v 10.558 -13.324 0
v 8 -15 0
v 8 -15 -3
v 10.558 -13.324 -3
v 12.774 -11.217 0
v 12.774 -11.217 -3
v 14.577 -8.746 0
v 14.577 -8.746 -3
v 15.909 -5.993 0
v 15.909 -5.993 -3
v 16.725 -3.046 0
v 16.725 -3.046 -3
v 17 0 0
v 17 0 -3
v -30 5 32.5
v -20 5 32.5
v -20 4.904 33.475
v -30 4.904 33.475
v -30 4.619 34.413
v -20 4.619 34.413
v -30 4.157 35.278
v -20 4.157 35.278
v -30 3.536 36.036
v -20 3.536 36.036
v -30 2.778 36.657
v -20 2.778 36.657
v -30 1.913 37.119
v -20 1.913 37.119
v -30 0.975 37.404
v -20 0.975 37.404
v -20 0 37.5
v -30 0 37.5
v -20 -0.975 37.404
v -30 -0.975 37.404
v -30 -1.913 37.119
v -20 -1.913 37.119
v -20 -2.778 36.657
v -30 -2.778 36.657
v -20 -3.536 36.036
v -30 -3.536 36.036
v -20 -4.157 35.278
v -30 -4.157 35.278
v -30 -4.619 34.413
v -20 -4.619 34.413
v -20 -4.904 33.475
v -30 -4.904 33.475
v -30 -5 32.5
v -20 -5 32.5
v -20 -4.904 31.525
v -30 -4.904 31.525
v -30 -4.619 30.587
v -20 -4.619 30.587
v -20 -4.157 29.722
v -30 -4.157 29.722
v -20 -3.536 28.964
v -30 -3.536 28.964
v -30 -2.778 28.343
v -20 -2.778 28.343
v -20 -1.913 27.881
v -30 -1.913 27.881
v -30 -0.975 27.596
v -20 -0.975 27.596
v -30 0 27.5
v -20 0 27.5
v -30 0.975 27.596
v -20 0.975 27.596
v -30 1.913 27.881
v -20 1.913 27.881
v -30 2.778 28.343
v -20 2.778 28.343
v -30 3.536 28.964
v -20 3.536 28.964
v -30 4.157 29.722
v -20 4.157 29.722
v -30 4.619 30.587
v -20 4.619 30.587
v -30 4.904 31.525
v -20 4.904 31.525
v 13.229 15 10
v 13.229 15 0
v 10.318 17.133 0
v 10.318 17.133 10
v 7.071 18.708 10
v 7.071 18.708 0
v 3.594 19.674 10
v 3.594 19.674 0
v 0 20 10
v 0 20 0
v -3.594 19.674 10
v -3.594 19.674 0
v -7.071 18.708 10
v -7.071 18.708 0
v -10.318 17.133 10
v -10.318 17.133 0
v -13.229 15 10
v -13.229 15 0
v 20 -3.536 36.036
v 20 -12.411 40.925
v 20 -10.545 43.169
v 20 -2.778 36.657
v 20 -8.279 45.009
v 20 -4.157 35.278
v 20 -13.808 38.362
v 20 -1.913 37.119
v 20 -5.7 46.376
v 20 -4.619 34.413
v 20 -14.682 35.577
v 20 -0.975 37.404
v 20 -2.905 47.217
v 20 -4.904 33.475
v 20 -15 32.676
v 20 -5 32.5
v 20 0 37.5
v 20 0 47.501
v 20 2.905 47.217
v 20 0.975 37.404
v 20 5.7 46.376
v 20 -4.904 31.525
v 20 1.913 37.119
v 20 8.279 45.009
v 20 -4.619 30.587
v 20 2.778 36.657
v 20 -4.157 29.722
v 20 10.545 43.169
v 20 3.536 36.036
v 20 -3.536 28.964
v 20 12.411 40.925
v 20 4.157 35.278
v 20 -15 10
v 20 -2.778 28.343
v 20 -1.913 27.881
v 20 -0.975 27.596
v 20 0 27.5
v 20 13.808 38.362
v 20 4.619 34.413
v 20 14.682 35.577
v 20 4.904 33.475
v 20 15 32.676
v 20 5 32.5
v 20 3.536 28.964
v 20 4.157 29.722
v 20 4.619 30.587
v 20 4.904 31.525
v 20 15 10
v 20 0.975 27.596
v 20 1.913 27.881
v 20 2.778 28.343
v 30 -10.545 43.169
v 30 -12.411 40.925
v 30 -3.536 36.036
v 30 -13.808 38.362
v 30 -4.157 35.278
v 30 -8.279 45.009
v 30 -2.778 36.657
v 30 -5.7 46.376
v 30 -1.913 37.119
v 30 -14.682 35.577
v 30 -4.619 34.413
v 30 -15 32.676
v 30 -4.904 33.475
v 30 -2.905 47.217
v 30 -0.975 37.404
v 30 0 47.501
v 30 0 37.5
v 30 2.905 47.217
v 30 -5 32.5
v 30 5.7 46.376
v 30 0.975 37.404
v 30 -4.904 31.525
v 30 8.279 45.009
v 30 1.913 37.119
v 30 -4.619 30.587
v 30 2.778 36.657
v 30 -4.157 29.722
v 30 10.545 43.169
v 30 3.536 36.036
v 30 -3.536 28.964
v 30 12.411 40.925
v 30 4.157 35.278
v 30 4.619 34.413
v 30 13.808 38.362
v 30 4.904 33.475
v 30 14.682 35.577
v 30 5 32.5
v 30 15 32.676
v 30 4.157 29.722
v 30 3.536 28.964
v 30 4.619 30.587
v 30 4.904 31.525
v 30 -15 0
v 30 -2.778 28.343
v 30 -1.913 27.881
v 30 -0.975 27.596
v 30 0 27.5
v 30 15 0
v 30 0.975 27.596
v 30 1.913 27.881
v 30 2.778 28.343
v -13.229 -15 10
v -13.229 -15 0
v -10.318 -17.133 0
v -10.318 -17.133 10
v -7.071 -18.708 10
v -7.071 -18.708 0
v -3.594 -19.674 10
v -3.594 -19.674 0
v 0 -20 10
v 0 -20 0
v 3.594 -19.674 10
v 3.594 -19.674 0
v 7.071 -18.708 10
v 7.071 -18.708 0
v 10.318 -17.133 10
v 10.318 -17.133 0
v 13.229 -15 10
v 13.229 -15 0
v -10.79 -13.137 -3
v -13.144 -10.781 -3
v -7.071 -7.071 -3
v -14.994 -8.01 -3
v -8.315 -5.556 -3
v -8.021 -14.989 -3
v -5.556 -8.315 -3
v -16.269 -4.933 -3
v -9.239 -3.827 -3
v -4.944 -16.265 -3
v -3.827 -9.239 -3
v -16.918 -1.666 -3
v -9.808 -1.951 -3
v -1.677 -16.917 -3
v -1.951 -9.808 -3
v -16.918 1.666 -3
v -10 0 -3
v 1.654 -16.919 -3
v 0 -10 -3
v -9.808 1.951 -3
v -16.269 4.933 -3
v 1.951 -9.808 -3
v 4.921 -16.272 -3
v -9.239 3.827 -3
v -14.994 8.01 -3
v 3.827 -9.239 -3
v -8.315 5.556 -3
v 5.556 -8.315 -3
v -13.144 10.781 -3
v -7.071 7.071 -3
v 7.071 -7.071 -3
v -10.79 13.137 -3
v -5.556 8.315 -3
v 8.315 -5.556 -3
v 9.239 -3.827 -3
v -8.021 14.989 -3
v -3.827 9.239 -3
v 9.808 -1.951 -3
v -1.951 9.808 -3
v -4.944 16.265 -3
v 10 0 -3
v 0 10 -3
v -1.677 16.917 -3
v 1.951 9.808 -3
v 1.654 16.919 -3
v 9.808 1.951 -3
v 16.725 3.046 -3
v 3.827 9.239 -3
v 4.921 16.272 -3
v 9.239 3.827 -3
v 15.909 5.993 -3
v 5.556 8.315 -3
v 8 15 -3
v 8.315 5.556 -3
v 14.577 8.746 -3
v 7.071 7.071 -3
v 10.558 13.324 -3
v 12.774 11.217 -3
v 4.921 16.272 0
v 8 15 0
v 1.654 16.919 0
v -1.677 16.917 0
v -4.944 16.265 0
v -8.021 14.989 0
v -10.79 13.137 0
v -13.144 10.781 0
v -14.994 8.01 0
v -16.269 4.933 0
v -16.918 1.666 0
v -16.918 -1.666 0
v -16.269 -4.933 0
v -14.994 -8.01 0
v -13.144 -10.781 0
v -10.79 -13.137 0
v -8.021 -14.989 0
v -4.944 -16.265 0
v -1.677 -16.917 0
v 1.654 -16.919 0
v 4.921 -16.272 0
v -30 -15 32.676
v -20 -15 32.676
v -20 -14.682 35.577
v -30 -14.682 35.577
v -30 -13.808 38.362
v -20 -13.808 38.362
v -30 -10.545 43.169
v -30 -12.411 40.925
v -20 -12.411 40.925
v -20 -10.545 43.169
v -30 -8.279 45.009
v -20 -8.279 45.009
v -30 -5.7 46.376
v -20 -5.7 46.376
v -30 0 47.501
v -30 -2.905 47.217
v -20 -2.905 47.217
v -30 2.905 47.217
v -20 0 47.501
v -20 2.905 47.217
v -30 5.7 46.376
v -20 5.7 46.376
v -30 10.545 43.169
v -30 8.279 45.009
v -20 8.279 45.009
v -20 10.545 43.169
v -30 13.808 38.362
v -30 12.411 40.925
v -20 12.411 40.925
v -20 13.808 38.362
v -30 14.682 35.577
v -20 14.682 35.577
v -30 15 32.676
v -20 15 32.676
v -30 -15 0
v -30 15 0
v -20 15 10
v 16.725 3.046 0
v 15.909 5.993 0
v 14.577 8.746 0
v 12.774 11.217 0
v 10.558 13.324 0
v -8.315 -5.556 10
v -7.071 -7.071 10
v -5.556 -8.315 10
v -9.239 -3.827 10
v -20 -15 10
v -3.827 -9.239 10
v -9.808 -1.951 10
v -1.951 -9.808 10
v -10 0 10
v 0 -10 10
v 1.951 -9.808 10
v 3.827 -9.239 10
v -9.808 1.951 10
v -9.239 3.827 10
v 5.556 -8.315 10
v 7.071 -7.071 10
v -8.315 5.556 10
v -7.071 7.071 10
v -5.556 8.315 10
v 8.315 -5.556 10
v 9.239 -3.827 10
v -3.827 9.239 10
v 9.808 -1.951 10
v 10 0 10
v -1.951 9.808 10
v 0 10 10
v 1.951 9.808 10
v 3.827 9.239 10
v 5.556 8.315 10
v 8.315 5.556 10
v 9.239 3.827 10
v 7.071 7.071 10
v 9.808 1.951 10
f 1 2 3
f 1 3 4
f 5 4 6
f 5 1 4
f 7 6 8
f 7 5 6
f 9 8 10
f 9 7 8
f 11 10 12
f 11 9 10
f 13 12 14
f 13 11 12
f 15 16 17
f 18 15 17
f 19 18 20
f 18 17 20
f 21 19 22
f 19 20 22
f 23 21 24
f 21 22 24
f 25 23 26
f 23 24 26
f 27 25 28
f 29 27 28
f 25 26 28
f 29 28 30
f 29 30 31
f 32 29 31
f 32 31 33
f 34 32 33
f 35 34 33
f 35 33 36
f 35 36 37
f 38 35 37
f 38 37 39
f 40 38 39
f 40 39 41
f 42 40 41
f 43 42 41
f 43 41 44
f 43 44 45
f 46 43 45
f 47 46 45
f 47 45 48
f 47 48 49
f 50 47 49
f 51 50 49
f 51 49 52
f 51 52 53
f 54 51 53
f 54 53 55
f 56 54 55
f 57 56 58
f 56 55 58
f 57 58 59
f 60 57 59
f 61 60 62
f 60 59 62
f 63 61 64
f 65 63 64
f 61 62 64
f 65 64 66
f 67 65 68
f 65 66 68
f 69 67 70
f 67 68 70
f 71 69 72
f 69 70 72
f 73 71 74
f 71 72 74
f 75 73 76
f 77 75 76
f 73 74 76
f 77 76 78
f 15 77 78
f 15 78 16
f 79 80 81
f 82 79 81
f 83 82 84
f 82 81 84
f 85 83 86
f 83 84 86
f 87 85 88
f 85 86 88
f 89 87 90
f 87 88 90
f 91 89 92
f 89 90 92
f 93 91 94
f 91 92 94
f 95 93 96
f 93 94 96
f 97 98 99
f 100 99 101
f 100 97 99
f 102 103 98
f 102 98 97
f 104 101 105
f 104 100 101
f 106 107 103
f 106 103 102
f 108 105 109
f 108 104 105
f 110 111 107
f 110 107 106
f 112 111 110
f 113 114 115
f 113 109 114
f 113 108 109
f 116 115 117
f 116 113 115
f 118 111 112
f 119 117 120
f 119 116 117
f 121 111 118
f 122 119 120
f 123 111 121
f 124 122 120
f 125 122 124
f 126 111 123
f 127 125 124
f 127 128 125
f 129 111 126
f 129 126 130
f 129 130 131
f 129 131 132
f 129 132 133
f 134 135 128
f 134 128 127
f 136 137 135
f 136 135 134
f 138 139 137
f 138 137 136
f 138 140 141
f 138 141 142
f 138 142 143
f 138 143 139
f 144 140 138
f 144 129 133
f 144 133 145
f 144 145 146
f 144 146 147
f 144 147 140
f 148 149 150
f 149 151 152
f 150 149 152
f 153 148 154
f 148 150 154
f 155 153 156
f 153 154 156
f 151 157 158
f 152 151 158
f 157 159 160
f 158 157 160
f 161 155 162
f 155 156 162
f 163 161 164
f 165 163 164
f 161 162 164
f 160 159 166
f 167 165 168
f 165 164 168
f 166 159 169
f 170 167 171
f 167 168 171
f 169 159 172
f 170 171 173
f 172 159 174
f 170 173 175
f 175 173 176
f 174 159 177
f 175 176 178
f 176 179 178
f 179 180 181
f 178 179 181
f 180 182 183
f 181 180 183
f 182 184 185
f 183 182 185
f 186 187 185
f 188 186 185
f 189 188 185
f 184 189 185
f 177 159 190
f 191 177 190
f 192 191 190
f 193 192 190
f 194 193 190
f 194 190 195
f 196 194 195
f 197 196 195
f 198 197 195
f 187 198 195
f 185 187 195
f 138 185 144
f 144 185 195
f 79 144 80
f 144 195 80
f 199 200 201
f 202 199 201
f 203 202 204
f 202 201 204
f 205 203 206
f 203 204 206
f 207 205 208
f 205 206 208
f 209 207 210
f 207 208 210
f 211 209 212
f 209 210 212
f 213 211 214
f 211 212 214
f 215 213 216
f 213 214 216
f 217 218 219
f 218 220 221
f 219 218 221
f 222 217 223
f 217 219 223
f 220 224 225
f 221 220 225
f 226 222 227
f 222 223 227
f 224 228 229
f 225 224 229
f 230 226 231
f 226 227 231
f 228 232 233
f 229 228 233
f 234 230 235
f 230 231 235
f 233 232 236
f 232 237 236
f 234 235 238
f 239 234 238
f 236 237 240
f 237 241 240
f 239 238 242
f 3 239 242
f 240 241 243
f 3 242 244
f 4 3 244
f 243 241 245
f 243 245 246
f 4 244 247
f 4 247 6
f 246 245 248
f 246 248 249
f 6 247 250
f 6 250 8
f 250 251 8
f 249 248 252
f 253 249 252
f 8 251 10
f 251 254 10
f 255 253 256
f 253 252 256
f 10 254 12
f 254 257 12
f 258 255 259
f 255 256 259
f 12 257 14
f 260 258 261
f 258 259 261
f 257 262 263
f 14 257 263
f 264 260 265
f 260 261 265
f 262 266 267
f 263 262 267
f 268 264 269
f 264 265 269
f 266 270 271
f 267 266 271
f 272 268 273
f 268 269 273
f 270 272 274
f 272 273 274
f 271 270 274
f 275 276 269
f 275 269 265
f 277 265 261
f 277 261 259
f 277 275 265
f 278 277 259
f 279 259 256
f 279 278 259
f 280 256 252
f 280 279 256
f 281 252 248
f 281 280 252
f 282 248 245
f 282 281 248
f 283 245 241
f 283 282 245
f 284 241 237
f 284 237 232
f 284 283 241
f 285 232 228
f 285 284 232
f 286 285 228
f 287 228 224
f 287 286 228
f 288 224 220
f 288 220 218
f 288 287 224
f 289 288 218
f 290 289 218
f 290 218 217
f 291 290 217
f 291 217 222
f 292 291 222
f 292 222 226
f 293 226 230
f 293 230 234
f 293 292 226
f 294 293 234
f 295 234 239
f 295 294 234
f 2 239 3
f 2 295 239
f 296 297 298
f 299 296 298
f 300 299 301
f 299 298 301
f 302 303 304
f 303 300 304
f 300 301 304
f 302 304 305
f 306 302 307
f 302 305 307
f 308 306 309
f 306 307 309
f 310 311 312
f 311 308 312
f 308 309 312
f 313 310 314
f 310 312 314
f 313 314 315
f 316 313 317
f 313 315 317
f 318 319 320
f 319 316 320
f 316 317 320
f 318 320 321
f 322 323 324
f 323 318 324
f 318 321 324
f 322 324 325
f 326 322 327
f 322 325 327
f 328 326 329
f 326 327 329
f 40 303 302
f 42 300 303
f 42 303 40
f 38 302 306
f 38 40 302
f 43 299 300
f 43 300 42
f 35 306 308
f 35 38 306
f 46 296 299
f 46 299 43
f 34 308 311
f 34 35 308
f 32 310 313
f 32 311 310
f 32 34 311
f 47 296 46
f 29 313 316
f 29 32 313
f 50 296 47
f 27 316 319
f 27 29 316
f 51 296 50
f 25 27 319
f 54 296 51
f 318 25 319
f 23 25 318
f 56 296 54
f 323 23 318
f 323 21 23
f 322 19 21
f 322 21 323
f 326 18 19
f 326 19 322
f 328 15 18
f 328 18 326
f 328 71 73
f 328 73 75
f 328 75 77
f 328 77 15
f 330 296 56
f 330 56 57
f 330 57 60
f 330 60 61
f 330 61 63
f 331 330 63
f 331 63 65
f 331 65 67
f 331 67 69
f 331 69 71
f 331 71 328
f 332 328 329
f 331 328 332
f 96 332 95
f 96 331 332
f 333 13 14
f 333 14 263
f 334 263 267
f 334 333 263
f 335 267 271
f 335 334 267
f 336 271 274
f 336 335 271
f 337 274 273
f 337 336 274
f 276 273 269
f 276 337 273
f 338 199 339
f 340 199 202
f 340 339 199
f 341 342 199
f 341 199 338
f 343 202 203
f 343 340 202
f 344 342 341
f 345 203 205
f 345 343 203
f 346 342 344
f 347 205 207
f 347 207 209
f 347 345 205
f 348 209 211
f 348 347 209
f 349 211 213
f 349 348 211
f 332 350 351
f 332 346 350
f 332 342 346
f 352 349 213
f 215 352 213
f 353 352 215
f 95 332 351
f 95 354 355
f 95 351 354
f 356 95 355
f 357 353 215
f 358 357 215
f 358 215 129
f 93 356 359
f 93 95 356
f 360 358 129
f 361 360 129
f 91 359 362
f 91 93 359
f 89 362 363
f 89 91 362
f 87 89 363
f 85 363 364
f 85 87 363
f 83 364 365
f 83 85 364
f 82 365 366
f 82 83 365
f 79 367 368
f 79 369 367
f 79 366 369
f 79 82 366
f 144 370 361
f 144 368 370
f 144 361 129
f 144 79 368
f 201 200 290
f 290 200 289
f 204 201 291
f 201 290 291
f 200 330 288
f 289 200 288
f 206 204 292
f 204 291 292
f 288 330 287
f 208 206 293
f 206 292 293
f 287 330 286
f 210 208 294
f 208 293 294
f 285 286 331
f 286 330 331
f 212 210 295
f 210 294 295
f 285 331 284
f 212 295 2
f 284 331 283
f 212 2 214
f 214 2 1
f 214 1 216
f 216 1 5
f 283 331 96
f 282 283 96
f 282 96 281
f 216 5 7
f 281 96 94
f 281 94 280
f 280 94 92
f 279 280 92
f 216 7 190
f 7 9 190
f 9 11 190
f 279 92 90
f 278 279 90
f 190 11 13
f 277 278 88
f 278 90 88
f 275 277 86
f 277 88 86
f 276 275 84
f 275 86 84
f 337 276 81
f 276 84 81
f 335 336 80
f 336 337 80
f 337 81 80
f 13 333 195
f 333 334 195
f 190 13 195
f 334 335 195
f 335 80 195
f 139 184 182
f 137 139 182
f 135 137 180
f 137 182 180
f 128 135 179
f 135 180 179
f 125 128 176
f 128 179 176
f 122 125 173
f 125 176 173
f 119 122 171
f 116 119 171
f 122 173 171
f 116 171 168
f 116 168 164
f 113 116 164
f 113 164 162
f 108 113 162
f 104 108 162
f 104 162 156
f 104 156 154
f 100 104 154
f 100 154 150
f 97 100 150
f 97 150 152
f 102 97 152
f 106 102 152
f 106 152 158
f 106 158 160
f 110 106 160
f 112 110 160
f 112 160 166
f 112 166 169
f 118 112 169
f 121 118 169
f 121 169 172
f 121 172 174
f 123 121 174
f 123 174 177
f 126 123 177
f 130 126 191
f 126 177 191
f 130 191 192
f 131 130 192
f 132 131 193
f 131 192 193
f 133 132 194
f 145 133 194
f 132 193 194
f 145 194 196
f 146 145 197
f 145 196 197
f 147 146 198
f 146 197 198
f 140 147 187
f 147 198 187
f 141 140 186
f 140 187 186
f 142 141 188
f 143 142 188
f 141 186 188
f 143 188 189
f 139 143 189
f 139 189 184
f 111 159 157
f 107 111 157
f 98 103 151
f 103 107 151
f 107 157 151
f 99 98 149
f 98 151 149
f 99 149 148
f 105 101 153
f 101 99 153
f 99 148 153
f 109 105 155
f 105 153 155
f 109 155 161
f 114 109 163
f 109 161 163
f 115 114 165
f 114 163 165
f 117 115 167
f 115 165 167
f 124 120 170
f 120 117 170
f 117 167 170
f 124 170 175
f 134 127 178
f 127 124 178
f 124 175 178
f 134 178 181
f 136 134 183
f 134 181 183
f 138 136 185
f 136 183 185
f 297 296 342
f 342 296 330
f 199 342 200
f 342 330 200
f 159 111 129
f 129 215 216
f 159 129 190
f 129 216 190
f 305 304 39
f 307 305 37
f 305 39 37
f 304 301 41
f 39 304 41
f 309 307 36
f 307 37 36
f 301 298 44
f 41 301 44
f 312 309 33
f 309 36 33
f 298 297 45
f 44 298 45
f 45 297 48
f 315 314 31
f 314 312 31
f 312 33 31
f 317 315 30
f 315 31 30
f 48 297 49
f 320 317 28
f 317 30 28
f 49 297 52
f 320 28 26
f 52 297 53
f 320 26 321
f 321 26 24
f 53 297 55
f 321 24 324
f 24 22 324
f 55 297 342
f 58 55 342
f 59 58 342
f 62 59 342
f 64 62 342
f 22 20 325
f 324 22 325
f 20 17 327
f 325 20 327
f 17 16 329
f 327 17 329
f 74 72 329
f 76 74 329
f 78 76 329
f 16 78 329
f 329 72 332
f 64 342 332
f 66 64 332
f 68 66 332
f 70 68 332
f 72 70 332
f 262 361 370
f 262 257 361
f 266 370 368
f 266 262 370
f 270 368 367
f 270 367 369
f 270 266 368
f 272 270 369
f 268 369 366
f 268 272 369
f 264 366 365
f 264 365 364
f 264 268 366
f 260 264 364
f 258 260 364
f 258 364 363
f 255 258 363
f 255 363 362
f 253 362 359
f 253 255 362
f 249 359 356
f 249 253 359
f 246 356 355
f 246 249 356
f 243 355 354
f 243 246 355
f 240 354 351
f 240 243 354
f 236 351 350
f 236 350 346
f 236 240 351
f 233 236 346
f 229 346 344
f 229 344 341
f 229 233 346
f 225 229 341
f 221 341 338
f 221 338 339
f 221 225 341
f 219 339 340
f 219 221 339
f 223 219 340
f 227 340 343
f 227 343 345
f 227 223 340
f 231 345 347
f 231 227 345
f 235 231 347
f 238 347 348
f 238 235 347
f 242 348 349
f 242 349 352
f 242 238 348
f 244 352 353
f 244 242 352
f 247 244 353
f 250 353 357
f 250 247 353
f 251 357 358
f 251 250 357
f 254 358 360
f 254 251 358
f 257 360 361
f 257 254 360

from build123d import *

# Parameters (mm, degrees)
F0_R     = 10
F1_DEPTH = 10
F2_DEPTH = 3
F3_W     = 10
F3_H     = 30
F4_DEPTH = 38
F5_R     = 5
F6_DEPTH = 75
F8_DEPTH = 75


with BuildPart() as f1:
    # F0 (on Top) → F1 (new body)
    with BuildSketch(Plane.XY):
        with BuildLine():
            ThreePointArc((13.2287565553, 15), (18.2287565553, 8.2287565553), (20, 0))
            ThreePointArc((20, 0), (18.2287565553, -8.2287565553), (13.2287565553, -15))
            Line((13.2287565553, -15), (30, -15))
            Line((30, -15), (30, 15))
            Line((30, 15), (13.2287565553, 15))
        make_face()
        with BuildLine():
            ThreePointArc((-13.2287565553, -15), (-20, 0), (-13.2287565553, 15))
            Line((-13.2287565553, 15), (-30, 15))
            Line((-30, 15), (-30, -15))
            Line((-30, -15), (-13.2287565553, -15))
        make_face()
        with BuildLine():
            Line((8, 15), (13.2287565553, 15))
            ThreePointArc((13.2287565553, 15), (0, 20), (-13.2287565553, 15))
            Line((-13.2287565553, 15), (-8, 15))
            ThreePointArc((-8, 15), (0, 17), (8, 15))
        make_face()
        with BuildLine():
            ThreePointArc((-13.2287565553, -15), (0, -20), (13.2287565553, -15))
            Line((13.2287565553, -15), (8, -15))
            ThreePointArc((8, -15), (0, -17), (-8, -15))
            Line((-8, -15), (-13.2287565553, -15))
        make_face()
        with BuildLine():
            ThreePointArc((13.2287565553, -15), (18.2287565553, -8.2287565553), (20, 0))
            ThreePointArc((20, 0), (18.2287565553, 8.2287565553), (13.2287565553, 15))
            Line((13.2287565553, 15), (8, 15))
            ThreePointArc((8, 15), (14.5773797371, 8.7464278423), (17, 0))
            ThreePointArc((17, 0), (14.5773797371, -8.7464278423), (8, -15))
            Line((8, -15), (13.2287565553, -15))
        make_face()
        with BuildLine():
            Line((-8, 15), (-13.2287565553, 15))
            ThreePointArc((-13.2287565553, 15), (-20, 0), (-13.2287565553, -15))
            Line((-13.2287565553, -15), (-8, -15))
            ThreePointArc((-8, -15), (-17, 0), (-8, 15))
        make_face()
        with BuildLine():
            ThreePointArc((17, 0), (14.5773797371, 8.7464278423), (8, 15))
            Line((8, 15), (-8, 15))
            ThreePointArc((-8, 15), (-17, 0), (-8, -15))
            Line((-8, -15), (8, -15))
            ThreePointArc((8, -15), (14.5773797371, -8.7464278423), (17, 0))
        make_face()
        Circle(F0_R, mode=Mode.SUBTRACT)
        with BuildLine():
            Line((-8, 15), (8, 15))
            ThreePointArc((8, 15), (0, 17), (-8, 15))
        make_face()
        with BuildLine():
            ThreePointArc((-8, -15), (0, -17), (8, -15))
            Line((8, -15), (-8, -15))
        make_face()
    extrude(amount=F1_DEPTH)

    # F0 (on Top) → F2 (join)
    with BuildSketch(Plane.XY):
        with BuildLine():
            ThreePointArc((17, 0), (14.5773797371, 8.7464278423), (8, 15))
            Line((8, 15), (-8, 15))
            ThreePointArc((-8, 15), (-17, 0), (-8, -15))
            Line((-8, -15), (8, -15))
            ThreePointArc((8, -15), (14.5773797371, -8.7464278423), (17, 0))
        make_face()
        Circle(F0_R, mode=Mode.SUBTRACT)
        with BuildLine():
            ThreePointArc((-8, -15), (0, -17), (8, -15))
            Line((8, -15), (-8, -15))
        make_face()
        with BuildLine():
            Line((-8, 15), (8, 15))
            ThreePointArc((8, 15), (0, 17), (-8, 15))
        make_face()
    extrude(amount=-F2_DEPTH)

    # F3 (on face) → F4 (join)
    with BuildSketch(Plane.XY.offset(10)):
        with Locations((-25, 0)):
            Rectangle(F3_W, F3_H)
        with Locations((25, 0)):
            Rectangle(F3_W, F3_H)
    extrude(amount=F4_DEPTH)

    # F5 (on face) → F6 (cut)
    with BuildSketch(Plane.YZ.offset(30)):
        with Locations((0, 32.5)):
            Circle(F5_R)
    extrude(amount=-F6_DEPTH, mode=Mode.SUBTRACT)

    # F7 (on face) → F8 (cut)
    with BuildSketch(Plane.YZ.offset(30)):
        with BuildLine():
            Line((-15, 48), (-15, 32.675947994))
            ThreePointArc((-15, 32.675947994), (0, 47.5010318877), (15, 32.675947994))
            Line((15, 32.675947994), (15, 48))
            Line((15, 48), (-15, 48))
        make_face()
    extrude(amount=-F8_DEPTH, mode=Mode.SUBTRACT)


solid = f1.part
